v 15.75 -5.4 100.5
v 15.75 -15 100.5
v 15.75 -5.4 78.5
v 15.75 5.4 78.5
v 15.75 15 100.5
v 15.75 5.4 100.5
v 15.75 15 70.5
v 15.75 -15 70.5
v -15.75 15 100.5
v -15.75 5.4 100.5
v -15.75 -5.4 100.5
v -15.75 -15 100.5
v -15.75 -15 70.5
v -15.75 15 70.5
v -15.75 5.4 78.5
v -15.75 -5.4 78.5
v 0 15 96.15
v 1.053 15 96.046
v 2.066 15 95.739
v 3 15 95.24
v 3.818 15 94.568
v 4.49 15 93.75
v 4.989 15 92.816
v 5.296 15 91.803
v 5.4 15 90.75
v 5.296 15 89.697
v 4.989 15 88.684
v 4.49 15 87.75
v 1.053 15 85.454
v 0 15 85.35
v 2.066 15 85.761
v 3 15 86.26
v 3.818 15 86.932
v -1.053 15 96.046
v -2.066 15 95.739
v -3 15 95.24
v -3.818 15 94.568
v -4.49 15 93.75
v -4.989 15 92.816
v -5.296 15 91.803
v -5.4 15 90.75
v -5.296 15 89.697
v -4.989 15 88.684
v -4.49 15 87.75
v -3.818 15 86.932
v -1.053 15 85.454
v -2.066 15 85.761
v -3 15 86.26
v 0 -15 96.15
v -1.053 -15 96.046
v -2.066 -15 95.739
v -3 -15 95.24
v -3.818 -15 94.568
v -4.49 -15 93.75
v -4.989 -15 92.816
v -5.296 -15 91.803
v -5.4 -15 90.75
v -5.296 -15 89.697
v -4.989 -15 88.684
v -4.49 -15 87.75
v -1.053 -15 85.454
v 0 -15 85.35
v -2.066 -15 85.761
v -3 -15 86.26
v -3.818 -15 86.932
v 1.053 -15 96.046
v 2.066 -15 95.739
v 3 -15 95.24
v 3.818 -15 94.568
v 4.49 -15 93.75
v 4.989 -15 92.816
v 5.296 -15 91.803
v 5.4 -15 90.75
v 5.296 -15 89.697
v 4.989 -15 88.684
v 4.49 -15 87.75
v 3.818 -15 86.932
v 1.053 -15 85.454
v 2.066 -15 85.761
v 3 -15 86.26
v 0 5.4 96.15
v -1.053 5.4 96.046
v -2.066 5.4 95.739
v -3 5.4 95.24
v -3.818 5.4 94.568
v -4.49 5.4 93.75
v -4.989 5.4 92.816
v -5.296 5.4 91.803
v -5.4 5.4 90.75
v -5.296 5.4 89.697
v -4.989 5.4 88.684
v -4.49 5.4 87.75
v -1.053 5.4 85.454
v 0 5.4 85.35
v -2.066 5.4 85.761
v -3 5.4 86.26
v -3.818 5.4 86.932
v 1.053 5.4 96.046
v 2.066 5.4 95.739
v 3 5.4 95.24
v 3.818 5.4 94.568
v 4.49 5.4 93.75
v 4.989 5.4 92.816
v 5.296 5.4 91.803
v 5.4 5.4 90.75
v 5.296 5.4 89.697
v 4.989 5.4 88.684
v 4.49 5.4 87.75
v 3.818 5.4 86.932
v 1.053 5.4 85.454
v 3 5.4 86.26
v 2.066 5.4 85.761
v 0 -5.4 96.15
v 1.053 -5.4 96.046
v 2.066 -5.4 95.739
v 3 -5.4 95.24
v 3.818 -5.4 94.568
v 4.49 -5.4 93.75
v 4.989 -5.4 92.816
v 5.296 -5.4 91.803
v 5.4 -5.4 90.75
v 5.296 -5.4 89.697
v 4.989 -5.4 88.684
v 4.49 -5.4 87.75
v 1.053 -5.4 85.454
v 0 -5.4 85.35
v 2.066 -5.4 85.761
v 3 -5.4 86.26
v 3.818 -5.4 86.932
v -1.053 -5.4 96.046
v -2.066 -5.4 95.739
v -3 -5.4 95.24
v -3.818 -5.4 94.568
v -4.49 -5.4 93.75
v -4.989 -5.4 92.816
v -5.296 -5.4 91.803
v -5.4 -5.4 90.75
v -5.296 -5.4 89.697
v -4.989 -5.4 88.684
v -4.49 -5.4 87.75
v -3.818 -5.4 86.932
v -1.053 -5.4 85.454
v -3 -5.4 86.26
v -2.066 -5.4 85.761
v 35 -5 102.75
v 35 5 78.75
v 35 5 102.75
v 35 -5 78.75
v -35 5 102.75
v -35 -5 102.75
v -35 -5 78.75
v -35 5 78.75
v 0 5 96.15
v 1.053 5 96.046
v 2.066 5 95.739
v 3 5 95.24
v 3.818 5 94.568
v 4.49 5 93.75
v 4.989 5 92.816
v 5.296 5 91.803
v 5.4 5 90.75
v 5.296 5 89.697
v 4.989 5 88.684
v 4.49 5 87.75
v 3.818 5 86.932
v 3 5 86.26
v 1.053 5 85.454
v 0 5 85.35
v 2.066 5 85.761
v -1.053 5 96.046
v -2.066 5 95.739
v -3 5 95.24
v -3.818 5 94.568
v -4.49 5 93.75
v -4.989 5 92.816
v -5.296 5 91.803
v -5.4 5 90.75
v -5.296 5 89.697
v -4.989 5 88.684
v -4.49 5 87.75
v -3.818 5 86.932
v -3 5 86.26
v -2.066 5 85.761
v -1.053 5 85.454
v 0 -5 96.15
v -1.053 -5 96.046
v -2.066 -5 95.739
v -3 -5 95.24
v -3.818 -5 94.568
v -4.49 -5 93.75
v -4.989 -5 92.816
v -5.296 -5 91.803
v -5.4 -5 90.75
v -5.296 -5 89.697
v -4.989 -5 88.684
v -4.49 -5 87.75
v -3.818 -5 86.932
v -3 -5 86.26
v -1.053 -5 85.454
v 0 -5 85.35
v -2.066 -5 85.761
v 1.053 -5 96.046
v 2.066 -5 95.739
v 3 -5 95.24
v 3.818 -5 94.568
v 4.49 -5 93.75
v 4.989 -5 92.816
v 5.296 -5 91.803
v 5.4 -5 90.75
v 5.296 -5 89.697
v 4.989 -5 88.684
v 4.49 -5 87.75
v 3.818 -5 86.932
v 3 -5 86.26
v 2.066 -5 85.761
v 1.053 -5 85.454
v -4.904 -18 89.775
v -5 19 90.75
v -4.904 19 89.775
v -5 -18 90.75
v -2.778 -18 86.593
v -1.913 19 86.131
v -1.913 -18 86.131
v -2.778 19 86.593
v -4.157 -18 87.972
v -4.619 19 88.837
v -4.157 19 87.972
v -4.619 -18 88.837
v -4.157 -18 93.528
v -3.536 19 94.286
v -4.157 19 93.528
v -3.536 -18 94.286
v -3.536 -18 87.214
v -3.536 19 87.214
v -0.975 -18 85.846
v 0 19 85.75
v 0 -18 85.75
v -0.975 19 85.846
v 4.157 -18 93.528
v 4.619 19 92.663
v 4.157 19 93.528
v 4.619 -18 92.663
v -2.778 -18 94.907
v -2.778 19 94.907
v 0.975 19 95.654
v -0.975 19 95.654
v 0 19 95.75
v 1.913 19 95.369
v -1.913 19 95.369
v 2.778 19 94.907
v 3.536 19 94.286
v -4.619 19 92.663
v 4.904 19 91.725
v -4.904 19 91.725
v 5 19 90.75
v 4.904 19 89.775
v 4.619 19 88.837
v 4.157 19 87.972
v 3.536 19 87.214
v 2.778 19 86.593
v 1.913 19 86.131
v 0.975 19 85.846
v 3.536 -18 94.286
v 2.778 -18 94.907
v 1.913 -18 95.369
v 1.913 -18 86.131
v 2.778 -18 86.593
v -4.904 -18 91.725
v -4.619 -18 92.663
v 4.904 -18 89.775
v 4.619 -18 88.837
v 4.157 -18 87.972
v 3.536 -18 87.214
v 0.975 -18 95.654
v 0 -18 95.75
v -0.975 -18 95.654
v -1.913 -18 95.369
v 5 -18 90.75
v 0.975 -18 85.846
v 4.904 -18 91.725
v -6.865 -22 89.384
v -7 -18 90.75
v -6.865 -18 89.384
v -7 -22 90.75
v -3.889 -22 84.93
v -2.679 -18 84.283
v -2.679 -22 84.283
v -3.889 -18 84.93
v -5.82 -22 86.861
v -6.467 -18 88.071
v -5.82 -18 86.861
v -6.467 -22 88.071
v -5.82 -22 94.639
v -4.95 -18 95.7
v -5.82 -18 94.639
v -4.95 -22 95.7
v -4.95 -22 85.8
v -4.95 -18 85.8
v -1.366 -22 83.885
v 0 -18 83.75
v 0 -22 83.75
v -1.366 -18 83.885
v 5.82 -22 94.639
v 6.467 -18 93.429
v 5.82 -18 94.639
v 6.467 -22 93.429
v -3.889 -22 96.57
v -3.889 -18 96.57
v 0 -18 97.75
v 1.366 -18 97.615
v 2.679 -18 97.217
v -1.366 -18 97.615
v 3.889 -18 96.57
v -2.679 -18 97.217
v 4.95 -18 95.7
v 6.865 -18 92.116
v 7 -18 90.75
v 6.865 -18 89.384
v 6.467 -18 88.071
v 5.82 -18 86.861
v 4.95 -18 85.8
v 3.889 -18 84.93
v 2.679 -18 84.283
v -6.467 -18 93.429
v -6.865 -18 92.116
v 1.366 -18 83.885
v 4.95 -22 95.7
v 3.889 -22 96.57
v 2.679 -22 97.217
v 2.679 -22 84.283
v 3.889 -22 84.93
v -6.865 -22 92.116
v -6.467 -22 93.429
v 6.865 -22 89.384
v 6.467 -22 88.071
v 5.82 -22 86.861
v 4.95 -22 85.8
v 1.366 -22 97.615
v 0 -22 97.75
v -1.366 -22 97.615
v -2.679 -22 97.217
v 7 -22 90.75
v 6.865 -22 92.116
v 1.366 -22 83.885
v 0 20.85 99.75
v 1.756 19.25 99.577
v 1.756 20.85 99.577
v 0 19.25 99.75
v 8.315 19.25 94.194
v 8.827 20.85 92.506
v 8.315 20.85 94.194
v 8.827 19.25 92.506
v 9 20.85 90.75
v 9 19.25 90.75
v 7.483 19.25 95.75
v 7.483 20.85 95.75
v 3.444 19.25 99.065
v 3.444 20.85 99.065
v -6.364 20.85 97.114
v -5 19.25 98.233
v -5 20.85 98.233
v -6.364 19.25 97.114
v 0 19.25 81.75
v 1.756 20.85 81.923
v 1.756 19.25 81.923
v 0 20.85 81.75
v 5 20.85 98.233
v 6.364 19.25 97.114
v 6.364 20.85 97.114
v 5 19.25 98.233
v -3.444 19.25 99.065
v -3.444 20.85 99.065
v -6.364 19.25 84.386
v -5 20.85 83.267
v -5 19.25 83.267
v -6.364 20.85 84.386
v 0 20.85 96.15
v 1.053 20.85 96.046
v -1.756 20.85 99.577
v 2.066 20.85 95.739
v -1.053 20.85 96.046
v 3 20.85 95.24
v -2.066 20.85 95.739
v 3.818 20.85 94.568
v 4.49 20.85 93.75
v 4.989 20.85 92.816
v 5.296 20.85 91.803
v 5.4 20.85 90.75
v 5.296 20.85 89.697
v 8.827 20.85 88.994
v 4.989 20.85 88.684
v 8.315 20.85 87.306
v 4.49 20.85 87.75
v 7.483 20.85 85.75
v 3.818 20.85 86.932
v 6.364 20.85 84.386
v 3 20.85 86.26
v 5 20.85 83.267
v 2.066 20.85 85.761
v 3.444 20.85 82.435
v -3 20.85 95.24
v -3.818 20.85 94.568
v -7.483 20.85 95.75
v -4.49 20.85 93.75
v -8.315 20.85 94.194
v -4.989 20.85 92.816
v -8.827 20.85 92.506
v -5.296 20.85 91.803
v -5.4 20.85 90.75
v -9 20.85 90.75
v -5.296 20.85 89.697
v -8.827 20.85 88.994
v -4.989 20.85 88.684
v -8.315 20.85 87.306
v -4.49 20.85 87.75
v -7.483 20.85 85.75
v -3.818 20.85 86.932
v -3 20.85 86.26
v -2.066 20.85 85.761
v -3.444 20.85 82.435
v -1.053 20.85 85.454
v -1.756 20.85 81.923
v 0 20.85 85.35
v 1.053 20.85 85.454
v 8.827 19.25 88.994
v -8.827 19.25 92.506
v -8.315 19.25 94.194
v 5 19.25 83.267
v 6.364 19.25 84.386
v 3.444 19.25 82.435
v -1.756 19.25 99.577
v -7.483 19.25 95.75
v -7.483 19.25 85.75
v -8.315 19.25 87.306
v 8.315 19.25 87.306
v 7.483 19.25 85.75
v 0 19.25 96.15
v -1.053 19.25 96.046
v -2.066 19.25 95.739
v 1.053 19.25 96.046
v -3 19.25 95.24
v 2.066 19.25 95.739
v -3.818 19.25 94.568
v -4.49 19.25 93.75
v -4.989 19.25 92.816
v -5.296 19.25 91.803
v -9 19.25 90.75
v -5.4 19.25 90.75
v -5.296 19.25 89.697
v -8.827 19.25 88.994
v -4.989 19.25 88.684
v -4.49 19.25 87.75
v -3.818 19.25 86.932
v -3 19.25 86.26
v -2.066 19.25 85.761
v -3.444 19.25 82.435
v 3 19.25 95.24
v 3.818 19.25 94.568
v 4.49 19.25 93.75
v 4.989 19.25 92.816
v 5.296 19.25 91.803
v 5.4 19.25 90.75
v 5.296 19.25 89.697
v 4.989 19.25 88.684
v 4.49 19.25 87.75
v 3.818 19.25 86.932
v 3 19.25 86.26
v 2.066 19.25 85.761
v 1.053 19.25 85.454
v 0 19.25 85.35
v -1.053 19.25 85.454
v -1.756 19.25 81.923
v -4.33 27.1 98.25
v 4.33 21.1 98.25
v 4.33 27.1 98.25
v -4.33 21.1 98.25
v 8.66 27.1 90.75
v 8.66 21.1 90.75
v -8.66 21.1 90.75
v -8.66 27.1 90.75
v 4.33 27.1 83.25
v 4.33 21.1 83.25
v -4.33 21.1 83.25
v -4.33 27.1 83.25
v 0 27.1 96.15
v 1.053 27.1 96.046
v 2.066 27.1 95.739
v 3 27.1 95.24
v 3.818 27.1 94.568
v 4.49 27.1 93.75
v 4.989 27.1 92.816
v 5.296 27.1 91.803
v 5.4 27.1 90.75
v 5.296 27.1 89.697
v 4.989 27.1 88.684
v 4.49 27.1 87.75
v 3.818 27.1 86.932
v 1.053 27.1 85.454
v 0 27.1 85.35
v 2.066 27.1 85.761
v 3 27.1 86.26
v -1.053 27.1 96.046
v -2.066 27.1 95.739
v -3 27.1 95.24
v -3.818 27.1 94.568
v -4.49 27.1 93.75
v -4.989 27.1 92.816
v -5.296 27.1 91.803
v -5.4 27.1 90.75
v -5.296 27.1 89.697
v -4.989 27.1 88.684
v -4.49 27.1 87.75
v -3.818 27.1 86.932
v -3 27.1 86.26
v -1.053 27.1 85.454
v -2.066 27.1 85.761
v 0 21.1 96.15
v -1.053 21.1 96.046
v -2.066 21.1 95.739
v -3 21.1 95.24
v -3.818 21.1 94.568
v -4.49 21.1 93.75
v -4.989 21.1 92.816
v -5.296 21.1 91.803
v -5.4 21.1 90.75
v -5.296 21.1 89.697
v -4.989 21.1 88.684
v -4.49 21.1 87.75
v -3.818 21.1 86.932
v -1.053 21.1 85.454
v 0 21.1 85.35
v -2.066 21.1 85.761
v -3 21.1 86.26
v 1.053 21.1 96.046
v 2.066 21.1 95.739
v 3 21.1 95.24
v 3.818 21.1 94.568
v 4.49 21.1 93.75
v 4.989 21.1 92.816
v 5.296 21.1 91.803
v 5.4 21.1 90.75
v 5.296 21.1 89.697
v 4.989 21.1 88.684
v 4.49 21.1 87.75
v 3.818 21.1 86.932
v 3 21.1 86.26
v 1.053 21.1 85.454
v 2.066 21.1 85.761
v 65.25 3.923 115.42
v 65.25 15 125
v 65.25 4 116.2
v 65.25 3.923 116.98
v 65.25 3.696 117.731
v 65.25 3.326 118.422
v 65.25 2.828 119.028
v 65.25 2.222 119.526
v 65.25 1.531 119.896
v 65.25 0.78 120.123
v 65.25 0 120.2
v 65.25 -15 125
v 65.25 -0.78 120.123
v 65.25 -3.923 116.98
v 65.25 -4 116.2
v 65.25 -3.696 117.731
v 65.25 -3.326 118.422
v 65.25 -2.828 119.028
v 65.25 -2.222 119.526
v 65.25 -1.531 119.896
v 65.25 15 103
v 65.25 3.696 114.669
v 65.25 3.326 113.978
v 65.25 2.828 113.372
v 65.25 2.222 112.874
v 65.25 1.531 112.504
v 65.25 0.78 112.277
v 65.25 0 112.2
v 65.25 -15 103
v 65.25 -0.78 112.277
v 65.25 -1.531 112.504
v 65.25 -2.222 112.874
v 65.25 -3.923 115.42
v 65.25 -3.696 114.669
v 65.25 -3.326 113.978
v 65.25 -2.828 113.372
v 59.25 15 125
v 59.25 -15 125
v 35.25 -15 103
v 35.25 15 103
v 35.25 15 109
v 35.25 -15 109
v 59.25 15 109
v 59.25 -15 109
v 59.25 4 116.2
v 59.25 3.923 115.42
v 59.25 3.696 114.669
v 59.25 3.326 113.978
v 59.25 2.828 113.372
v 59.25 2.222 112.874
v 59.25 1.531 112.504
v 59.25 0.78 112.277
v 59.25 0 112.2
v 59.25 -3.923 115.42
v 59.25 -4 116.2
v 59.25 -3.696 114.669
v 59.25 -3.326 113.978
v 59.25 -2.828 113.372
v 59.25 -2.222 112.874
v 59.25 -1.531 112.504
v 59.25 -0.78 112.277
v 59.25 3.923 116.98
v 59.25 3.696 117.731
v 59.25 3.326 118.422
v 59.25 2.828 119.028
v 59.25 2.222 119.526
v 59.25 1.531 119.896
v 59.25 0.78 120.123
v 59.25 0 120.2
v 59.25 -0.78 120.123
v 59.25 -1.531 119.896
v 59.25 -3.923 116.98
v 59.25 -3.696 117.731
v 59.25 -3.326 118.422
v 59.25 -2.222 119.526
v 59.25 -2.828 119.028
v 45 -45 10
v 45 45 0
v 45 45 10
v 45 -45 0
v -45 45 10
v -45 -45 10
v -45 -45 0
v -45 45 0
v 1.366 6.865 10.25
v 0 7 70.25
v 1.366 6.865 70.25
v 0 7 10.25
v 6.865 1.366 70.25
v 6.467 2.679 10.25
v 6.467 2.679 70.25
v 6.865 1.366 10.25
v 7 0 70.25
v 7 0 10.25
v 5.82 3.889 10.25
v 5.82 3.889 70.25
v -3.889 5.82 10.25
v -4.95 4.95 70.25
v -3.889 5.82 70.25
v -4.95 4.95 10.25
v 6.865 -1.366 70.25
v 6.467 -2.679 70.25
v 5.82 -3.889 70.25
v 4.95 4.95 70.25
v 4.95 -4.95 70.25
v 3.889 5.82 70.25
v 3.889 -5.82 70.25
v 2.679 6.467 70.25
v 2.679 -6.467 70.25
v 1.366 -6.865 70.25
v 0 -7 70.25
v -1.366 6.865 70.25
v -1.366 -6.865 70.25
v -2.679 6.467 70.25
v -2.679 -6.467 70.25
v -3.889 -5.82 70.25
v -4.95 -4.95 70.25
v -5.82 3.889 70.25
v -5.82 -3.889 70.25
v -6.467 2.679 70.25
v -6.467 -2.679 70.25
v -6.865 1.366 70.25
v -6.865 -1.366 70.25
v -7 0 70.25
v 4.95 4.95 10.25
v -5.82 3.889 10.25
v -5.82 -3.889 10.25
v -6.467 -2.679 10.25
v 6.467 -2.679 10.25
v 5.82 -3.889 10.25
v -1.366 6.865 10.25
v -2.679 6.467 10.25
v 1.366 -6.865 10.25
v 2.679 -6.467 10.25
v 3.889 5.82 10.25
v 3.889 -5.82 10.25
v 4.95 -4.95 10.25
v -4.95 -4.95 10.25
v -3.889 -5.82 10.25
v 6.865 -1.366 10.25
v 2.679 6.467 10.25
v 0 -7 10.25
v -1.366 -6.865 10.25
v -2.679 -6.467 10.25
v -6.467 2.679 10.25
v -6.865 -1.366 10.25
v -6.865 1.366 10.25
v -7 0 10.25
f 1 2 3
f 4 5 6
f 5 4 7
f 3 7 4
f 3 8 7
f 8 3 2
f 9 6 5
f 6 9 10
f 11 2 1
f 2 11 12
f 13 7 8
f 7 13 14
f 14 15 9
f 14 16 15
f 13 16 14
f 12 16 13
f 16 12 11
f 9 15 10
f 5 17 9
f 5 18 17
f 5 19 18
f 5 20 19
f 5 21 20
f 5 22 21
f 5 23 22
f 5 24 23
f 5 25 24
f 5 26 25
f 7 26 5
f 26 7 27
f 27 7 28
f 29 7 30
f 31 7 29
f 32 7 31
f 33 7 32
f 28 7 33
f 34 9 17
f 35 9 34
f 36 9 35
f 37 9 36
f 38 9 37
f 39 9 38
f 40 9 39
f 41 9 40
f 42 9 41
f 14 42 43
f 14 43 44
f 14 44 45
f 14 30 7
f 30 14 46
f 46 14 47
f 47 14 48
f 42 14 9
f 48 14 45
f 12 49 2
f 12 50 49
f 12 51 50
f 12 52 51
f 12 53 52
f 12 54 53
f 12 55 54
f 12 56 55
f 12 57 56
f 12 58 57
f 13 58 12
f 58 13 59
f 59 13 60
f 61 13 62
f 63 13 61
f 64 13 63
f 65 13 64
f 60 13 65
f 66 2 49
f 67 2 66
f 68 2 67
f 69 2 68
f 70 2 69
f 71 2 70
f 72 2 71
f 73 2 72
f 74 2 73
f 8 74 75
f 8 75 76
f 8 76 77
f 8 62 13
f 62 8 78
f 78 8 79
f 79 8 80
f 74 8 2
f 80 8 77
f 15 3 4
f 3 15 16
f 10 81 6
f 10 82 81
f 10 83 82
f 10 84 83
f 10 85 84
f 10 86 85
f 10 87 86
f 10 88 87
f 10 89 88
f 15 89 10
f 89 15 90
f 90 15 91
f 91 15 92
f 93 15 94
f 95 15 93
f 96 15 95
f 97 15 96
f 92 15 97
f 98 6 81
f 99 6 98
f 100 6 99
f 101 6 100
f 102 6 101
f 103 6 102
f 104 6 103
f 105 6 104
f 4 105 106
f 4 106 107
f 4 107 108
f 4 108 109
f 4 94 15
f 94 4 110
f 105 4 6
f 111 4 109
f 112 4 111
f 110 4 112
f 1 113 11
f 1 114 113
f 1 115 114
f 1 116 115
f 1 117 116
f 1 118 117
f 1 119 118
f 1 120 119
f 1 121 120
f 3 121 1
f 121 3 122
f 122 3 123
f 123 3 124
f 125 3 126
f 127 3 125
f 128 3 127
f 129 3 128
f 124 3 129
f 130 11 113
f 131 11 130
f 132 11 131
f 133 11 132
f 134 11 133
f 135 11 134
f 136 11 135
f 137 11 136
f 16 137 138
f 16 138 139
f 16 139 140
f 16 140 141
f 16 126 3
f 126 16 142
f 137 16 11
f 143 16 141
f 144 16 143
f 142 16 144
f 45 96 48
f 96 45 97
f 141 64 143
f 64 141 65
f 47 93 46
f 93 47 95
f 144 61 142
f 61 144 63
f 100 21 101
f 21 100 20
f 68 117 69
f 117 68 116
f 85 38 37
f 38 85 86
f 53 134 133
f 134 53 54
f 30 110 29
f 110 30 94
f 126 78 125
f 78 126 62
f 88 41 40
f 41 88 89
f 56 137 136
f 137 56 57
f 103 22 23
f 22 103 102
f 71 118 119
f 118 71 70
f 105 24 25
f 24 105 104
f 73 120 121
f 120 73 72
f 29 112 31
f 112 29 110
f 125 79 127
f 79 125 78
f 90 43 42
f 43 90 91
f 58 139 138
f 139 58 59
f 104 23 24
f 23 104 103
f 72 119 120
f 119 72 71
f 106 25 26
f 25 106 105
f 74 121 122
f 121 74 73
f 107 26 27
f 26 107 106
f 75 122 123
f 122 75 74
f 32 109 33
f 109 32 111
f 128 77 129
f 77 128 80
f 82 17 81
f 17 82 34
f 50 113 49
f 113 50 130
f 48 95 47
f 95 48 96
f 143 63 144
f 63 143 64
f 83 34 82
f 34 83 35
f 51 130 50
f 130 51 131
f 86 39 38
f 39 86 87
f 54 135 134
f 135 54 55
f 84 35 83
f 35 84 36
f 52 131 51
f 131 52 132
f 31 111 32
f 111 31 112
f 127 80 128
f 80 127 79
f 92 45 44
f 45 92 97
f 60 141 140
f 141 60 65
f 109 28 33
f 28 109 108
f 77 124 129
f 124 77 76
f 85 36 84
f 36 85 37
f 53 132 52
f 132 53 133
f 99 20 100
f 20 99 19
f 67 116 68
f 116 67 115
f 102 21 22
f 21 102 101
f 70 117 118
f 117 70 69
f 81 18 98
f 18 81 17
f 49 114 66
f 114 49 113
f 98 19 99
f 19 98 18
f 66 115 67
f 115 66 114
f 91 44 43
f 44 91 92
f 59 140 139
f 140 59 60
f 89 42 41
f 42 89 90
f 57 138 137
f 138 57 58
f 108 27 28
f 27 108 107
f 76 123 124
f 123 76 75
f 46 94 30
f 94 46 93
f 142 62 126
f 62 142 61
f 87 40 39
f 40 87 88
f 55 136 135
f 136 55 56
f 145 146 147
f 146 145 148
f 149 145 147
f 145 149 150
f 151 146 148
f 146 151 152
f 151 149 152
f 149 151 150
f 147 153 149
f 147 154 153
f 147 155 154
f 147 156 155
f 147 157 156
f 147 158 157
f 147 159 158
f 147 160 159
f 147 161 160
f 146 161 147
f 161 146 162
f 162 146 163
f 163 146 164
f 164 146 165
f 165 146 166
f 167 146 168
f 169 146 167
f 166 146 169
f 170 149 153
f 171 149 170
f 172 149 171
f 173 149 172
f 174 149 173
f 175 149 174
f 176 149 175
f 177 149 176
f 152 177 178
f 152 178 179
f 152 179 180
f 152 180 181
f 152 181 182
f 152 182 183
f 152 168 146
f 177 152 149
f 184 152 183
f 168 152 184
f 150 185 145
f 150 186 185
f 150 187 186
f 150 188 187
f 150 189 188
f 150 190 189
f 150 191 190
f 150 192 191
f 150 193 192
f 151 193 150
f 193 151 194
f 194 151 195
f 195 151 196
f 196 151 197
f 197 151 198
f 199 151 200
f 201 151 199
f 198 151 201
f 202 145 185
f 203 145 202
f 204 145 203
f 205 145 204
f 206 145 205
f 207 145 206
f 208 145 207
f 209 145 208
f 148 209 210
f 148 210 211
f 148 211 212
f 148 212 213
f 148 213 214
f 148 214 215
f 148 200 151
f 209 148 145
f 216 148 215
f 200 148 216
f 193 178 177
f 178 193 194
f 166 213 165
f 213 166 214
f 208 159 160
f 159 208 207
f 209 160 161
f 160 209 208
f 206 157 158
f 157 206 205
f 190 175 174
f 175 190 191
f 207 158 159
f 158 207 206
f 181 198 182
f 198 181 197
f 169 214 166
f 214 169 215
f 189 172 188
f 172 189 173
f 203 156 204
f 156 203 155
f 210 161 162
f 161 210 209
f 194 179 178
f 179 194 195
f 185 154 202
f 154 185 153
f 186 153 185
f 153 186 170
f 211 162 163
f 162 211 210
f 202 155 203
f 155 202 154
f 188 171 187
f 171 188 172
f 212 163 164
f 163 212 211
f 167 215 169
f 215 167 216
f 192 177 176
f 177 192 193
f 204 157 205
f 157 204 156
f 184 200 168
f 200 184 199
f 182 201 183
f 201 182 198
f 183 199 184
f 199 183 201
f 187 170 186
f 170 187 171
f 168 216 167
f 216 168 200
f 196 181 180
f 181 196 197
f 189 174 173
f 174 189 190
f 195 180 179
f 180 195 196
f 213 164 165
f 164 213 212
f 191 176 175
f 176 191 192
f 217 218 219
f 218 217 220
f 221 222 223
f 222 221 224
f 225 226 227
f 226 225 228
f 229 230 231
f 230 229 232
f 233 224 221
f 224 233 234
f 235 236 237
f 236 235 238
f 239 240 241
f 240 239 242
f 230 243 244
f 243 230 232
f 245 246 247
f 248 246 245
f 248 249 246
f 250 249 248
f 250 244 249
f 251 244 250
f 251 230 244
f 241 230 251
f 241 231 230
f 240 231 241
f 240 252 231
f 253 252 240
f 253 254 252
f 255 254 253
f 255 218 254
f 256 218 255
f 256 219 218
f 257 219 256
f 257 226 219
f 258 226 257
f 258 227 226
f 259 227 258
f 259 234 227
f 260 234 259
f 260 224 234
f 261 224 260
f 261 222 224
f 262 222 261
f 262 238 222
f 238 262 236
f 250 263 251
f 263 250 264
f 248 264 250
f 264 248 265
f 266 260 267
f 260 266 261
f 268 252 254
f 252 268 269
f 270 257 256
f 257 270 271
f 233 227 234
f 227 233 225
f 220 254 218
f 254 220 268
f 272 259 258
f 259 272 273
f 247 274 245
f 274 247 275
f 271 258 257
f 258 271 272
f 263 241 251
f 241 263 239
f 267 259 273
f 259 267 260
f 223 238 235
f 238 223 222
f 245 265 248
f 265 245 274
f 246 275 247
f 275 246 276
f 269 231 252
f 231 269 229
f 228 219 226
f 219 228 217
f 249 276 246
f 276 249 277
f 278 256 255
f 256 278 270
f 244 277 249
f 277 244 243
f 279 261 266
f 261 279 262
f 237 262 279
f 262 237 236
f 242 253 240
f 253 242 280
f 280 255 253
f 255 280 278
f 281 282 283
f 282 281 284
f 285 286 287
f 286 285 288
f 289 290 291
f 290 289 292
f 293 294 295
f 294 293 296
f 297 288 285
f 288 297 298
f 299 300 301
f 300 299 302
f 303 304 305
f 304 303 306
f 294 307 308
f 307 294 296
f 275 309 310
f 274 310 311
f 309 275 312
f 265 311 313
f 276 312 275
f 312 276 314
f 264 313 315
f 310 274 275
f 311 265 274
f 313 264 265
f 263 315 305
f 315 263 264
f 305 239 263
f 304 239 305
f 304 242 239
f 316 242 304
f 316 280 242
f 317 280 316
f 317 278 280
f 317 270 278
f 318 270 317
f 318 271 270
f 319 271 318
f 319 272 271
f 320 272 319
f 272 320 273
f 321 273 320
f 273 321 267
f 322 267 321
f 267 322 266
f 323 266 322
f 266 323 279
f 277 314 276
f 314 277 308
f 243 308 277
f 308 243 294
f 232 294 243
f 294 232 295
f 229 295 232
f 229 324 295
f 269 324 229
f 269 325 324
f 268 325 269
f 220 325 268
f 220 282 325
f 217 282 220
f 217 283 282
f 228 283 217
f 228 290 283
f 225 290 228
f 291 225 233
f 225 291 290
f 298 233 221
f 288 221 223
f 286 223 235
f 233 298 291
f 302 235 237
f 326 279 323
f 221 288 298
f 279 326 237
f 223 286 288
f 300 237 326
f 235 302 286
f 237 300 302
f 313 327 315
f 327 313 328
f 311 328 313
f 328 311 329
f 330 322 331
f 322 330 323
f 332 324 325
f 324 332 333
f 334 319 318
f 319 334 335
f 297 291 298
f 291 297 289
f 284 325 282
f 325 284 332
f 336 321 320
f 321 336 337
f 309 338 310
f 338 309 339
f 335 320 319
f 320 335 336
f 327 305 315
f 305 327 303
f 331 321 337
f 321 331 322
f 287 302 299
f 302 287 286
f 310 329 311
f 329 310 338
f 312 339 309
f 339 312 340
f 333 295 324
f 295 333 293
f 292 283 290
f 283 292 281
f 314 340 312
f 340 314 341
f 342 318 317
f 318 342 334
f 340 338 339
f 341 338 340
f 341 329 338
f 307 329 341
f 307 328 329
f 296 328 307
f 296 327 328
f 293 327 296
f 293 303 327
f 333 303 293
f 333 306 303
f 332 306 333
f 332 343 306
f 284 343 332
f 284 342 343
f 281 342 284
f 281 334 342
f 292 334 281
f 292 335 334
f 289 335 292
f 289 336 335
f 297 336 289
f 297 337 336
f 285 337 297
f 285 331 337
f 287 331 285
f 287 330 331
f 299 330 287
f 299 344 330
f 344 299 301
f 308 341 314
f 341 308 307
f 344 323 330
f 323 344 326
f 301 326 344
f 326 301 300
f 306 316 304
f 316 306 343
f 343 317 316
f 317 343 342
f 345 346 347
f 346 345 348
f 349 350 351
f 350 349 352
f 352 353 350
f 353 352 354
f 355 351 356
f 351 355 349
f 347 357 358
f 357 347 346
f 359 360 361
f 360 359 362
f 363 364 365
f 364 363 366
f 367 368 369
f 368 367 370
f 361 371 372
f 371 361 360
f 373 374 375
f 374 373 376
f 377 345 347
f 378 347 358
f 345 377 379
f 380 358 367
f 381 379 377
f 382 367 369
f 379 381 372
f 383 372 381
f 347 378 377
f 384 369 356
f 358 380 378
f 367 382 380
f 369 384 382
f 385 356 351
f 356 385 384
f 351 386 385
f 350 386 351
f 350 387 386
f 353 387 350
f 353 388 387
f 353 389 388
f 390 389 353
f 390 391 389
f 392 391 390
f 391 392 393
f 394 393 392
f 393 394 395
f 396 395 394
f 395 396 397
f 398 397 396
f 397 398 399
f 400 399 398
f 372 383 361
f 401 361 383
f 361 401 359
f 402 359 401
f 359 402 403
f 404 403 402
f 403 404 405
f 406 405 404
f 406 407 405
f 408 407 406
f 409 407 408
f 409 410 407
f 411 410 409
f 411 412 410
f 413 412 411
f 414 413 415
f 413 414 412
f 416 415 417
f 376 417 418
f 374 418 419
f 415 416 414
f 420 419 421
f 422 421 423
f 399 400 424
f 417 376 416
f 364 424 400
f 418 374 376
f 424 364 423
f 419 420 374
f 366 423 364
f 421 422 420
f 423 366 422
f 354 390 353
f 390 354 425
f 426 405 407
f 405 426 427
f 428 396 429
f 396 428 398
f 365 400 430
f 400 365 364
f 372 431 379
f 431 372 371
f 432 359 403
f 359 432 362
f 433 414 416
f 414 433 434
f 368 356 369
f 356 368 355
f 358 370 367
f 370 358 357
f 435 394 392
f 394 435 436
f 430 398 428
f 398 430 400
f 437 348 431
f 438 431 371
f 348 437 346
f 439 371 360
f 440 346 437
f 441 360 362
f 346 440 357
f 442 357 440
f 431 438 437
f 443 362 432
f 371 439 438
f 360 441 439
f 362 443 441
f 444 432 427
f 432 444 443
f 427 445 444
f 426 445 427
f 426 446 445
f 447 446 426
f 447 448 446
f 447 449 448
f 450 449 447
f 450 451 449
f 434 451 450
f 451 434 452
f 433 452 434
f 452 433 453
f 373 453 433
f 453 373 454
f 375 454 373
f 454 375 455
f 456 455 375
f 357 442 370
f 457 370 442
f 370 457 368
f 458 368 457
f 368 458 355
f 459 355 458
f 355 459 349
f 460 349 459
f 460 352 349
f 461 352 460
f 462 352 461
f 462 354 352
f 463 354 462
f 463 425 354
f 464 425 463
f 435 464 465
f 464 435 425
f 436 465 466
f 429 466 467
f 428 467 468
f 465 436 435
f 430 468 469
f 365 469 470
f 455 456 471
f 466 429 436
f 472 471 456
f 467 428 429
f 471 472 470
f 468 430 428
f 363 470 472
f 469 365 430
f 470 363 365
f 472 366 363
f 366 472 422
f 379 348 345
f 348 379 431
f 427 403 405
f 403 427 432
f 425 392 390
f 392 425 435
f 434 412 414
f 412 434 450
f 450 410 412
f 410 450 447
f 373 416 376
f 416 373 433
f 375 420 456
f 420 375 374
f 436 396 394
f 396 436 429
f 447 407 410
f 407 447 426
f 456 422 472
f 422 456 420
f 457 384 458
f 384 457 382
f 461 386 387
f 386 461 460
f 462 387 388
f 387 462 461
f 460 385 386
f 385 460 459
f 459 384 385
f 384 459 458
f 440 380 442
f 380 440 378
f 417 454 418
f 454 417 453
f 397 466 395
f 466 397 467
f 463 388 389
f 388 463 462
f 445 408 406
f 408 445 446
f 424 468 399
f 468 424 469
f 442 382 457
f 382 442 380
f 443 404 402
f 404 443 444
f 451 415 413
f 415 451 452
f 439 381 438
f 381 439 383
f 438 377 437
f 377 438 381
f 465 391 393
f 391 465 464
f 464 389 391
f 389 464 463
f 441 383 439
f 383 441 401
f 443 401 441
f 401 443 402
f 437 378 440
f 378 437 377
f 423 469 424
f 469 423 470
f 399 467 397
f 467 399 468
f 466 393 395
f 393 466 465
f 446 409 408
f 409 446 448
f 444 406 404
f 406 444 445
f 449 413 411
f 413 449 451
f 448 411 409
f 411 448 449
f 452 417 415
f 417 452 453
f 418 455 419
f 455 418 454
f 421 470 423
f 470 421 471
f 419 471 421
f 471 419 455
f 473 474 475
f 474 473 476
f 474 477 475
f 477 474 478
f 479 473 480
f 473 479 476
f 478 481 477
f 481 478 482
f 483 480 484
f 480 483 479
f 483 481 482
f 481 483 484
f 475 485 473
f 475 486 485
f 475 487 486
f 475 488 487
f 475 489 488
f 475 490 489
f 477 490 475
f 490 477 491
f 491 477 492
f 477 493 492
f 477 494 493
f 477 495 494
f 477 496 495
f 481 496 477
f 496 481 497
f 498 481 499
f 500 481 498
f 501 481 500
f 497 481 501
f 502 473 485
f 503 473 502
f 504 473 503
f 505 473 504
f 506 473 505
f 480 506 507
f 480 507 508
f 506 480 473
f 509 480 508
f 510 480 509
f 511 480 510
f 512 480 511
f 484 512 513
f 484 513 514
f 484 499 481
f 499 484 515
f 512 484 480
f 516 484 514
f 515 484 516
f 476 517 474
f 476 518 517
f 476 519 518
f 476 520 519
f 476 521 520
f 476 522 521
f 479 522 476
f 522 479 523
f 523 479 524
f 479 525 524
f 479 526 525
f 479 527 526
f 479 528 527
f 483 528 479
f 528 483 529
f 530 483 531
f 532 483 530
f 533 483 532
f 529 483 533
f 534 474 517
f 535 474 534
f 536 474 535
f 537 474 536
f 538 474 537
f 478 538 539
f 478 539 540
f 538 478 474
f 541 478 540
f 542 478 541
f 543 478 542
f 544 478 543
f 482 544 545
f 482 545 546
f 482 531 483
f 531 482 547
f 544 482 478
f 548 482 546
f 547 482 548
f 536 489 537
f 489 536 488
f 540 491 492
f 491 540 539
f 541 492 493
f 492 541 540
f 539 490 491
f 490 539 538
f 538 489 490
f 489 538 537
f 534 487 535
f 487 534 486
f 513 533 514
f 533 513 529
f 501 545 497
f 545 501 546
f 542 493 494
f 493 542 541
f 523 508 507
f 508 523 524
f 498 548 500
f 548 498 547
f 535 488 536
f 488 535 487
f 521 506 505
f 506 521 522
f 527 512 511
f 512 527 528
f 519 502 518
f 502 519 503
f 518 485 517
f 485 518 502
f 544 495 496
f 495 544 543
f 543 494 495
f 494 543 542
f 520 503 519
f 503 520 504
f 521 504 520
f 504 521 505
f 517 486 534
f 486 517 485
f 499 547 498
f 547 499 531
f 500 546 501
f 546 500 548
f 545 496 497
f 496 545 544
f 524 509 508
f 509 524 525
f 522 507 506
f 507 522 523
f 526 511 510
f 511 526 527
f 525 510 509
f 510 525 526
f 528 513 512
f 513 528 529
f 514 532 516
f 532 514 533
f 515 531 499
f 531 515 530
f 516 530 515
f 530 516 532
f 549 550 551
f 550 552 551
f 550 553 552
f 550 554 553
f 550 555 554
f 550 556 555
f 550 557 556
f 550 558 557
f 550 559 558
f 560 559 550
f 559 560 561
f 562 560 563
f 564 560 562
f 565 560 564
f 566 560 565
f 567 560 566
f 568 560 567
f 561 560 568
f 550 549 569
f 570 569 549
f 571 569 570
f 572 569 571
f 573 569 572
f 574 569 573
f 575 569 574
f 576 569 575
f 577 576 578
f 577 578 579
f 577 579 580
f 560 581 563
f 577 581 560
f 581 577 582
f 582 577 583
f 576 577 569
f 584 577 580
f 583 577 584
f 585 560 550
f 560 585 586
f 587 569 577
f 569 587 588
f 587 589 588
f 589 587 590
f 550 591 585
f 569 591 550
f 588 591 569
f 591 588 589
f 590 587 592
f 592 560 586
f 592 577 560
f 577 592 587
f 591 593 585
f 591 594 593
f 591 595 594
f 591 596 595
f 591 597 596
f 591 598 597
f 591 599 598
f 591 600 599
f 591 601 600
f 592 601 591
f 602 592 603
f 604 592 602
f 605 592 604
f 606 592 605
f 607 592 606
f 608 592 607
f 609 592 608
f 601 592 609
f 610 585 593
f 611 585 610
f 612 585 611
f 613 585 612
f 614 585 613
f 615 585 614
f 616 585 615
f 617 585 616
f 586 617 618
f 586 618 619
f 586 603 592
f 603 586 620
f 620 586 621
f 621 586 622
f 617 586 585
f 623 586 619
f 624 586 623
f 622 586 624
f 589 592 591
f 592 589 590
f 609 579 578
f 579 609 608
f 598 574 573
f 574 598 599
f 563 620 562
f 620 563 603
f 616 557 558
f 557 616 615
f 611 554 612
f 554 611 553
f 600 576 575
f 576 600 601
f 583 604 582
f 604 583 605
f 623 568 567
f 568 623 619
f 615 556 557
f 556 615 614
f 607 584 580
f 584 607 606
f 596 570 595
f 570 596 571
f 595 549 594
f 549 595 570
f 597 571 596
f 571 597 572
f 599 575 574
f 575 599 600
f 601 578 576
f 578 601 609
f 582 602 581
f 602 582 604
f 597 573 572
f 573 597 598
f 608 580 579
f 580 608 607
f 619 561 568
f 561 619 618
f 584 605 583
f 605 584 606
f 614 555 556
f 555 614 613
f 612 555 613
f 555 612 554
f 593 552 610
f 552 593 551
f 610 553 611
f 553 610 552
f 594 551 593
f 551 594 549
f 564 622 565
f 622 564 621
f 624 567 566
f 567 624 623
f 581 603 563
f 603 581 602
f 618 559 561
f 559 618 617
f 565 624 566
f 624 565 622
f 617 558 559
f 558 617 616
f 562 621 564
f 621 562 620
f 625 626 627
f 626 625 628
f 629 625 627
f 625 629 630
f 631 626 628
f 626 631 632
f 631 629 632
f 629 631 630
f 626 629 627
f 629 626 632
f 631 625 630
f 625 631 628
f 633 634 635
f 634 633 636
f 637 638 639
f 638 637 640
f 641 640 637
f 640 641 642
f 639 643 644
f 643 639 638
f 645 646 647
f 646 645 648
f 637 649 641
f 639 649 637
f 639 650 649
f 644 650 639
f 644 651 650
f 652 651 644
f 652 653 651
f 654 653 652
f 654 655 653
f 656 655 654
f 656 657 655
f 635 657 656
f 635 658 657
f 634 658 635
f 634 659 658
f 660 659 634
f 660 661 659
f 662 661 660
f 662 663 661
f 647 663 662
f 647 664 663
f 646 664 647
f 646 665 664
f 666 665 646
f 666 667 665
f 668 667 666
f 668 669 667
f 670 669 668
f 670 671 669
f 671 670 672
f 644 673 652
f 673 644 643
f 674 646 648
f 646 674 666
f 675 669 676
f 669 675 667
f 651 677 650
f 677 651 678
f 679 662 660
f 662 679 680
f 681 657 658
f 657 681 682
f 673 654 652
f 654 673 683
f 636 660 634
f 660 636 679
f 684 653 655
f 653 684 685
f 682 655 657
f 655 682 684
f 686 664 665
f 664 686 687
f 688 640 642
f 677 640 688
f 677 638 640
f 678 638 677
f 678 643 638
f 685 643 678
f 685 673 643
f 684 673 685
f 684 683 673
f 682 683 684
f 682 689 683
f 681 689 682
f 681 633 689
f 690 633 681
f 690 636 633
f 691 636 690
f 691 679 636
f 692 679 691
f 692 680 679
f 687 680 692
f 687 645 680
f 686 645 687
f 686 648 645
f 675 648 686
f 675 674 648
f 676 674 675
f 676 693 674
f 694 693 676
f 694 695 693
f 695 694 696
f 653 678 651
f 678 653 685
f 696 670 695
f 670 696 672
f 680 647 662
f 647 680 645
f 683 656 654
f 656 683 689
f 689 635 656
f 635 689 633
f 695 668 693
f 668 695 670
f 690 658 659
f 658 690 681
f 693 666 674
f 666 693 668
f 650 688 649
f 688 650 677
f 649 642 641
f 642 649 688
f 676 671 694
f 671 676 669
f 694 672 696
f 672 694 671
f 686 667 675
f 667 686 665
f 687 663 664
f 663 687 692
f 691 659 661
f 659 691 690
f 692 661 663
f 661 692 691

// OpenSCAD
$fn = 32;

// ------------------------------------------------------------------------
// Lamp arm: column d14 x 60 mm, arm 70 mm
// Every part is its own module, assembly() places every instance.
// ------------------------------------------------------------------------

// --- part 1 ---
module lamp_base() {
  difference() {
    translate([-45, -45, 0]) cube([90, 90, 10]);
  }
}

// --- part 2 ---
module lamp_column() {
  cylinder(h = 60, d = 14);
}

// --- part 3 ---
module head_fork() {
  difference() {
    translate([-15.75, -15, 0]) cube([31.5, 30, 30]);
    translate([-16.75, -5.4, 8]) cube([33.5, 10.8, 23]);
    translate([0, 0, 20.25]) rotate([90, 0, 0]) cylinder(h = 32, d = 10.8, center = true);
  }
}

// --- part 4 ---
module lamp_arm() {
  difference() {
    translate([-35, -5, 0]) cube([70, 10, 24]);
    translate([0, 0, 12]) rotate([90, 0, 0]) cylinder(h = 12, d = 10.8, center = true);
  }
}

// --- part 5 ---
module arm_pin() {
  rotate([0, 90, 0]) cylinder(h = 38, d = 10, center = true);
  translate([-22, 0, 0]) rotate([0, 90, 0]) cylinder(h = 4, d = 14);
}

// --- part 6 ---
module arm_washer() {
  difference() {
      translate([0, 0, 0]) cylinder(h = 1.6, d = 18);
      translate([0, 0, -1]) cylinder(h = 3.6, d = 10.8);
    }
}

// --- part 7 ---
module arm_nut() {
  difference() {
    linear_extrude(height = 6) polygon(points = [[8.66, 0], [4.33, 7.5], [-4.33, 7.5], [-8.66, 0], [-4.33, -7.5], [4.33, -7.5]]);
    translate([0, 0, -1]) cylinder(h = 8, d = 10.8);
  }
}

// --- part 8 ---
module shade_bracket() {
  difference() {
    translate([-15, -15, 0]) cube([30, 30, 22]);
    translate([-16, -16, 6]) cube([25, 32, 17]);
    translate([12, 0, 13.2]) rotate([0, 90, 0]) cylinder(h = 8, d = 8, center = true);
  }
}

// --- assembly ---
module assembly() {
  color([0.80, 0.24, 0.20]) translate([0, 0, 0]) rotate([0, 0, 0]) lamp_base();
  color([0.20, 0.45, 0.75]) translate([0, 0, 10.25]) rotate([0, 0, 0]) lamp_column();
  color([0.25, 0.62, 0.32]) translate([0, 0, 70.5]) rotate([0, 0, 0]) head_fork();
  color([0.92, 0.70, 0.18]) translate([0, 0, 78.75]) rotate([0, 0, 0]) lamp_arm();
  color([0.58, 0.35, 0.70]) translate([0, 0, 90.75]) rotate([0, 0, 90]) arm_pin();
  color([0.16, 0.66, 0.66]) translate([0, 20.85, 90.75]) rotate([90, 0, 0]) arm_washer();
  color([0.85, 0.48, 0.18]) translate([0, 27.1, 90.75]) rotate([90, 0, 0]) arm_nut();
  color([0.55, 0.60, 0.65]) translate([50.25, 0, 103]) rotate([0, 0, 0]) shade_bracket();
}

assembly();
